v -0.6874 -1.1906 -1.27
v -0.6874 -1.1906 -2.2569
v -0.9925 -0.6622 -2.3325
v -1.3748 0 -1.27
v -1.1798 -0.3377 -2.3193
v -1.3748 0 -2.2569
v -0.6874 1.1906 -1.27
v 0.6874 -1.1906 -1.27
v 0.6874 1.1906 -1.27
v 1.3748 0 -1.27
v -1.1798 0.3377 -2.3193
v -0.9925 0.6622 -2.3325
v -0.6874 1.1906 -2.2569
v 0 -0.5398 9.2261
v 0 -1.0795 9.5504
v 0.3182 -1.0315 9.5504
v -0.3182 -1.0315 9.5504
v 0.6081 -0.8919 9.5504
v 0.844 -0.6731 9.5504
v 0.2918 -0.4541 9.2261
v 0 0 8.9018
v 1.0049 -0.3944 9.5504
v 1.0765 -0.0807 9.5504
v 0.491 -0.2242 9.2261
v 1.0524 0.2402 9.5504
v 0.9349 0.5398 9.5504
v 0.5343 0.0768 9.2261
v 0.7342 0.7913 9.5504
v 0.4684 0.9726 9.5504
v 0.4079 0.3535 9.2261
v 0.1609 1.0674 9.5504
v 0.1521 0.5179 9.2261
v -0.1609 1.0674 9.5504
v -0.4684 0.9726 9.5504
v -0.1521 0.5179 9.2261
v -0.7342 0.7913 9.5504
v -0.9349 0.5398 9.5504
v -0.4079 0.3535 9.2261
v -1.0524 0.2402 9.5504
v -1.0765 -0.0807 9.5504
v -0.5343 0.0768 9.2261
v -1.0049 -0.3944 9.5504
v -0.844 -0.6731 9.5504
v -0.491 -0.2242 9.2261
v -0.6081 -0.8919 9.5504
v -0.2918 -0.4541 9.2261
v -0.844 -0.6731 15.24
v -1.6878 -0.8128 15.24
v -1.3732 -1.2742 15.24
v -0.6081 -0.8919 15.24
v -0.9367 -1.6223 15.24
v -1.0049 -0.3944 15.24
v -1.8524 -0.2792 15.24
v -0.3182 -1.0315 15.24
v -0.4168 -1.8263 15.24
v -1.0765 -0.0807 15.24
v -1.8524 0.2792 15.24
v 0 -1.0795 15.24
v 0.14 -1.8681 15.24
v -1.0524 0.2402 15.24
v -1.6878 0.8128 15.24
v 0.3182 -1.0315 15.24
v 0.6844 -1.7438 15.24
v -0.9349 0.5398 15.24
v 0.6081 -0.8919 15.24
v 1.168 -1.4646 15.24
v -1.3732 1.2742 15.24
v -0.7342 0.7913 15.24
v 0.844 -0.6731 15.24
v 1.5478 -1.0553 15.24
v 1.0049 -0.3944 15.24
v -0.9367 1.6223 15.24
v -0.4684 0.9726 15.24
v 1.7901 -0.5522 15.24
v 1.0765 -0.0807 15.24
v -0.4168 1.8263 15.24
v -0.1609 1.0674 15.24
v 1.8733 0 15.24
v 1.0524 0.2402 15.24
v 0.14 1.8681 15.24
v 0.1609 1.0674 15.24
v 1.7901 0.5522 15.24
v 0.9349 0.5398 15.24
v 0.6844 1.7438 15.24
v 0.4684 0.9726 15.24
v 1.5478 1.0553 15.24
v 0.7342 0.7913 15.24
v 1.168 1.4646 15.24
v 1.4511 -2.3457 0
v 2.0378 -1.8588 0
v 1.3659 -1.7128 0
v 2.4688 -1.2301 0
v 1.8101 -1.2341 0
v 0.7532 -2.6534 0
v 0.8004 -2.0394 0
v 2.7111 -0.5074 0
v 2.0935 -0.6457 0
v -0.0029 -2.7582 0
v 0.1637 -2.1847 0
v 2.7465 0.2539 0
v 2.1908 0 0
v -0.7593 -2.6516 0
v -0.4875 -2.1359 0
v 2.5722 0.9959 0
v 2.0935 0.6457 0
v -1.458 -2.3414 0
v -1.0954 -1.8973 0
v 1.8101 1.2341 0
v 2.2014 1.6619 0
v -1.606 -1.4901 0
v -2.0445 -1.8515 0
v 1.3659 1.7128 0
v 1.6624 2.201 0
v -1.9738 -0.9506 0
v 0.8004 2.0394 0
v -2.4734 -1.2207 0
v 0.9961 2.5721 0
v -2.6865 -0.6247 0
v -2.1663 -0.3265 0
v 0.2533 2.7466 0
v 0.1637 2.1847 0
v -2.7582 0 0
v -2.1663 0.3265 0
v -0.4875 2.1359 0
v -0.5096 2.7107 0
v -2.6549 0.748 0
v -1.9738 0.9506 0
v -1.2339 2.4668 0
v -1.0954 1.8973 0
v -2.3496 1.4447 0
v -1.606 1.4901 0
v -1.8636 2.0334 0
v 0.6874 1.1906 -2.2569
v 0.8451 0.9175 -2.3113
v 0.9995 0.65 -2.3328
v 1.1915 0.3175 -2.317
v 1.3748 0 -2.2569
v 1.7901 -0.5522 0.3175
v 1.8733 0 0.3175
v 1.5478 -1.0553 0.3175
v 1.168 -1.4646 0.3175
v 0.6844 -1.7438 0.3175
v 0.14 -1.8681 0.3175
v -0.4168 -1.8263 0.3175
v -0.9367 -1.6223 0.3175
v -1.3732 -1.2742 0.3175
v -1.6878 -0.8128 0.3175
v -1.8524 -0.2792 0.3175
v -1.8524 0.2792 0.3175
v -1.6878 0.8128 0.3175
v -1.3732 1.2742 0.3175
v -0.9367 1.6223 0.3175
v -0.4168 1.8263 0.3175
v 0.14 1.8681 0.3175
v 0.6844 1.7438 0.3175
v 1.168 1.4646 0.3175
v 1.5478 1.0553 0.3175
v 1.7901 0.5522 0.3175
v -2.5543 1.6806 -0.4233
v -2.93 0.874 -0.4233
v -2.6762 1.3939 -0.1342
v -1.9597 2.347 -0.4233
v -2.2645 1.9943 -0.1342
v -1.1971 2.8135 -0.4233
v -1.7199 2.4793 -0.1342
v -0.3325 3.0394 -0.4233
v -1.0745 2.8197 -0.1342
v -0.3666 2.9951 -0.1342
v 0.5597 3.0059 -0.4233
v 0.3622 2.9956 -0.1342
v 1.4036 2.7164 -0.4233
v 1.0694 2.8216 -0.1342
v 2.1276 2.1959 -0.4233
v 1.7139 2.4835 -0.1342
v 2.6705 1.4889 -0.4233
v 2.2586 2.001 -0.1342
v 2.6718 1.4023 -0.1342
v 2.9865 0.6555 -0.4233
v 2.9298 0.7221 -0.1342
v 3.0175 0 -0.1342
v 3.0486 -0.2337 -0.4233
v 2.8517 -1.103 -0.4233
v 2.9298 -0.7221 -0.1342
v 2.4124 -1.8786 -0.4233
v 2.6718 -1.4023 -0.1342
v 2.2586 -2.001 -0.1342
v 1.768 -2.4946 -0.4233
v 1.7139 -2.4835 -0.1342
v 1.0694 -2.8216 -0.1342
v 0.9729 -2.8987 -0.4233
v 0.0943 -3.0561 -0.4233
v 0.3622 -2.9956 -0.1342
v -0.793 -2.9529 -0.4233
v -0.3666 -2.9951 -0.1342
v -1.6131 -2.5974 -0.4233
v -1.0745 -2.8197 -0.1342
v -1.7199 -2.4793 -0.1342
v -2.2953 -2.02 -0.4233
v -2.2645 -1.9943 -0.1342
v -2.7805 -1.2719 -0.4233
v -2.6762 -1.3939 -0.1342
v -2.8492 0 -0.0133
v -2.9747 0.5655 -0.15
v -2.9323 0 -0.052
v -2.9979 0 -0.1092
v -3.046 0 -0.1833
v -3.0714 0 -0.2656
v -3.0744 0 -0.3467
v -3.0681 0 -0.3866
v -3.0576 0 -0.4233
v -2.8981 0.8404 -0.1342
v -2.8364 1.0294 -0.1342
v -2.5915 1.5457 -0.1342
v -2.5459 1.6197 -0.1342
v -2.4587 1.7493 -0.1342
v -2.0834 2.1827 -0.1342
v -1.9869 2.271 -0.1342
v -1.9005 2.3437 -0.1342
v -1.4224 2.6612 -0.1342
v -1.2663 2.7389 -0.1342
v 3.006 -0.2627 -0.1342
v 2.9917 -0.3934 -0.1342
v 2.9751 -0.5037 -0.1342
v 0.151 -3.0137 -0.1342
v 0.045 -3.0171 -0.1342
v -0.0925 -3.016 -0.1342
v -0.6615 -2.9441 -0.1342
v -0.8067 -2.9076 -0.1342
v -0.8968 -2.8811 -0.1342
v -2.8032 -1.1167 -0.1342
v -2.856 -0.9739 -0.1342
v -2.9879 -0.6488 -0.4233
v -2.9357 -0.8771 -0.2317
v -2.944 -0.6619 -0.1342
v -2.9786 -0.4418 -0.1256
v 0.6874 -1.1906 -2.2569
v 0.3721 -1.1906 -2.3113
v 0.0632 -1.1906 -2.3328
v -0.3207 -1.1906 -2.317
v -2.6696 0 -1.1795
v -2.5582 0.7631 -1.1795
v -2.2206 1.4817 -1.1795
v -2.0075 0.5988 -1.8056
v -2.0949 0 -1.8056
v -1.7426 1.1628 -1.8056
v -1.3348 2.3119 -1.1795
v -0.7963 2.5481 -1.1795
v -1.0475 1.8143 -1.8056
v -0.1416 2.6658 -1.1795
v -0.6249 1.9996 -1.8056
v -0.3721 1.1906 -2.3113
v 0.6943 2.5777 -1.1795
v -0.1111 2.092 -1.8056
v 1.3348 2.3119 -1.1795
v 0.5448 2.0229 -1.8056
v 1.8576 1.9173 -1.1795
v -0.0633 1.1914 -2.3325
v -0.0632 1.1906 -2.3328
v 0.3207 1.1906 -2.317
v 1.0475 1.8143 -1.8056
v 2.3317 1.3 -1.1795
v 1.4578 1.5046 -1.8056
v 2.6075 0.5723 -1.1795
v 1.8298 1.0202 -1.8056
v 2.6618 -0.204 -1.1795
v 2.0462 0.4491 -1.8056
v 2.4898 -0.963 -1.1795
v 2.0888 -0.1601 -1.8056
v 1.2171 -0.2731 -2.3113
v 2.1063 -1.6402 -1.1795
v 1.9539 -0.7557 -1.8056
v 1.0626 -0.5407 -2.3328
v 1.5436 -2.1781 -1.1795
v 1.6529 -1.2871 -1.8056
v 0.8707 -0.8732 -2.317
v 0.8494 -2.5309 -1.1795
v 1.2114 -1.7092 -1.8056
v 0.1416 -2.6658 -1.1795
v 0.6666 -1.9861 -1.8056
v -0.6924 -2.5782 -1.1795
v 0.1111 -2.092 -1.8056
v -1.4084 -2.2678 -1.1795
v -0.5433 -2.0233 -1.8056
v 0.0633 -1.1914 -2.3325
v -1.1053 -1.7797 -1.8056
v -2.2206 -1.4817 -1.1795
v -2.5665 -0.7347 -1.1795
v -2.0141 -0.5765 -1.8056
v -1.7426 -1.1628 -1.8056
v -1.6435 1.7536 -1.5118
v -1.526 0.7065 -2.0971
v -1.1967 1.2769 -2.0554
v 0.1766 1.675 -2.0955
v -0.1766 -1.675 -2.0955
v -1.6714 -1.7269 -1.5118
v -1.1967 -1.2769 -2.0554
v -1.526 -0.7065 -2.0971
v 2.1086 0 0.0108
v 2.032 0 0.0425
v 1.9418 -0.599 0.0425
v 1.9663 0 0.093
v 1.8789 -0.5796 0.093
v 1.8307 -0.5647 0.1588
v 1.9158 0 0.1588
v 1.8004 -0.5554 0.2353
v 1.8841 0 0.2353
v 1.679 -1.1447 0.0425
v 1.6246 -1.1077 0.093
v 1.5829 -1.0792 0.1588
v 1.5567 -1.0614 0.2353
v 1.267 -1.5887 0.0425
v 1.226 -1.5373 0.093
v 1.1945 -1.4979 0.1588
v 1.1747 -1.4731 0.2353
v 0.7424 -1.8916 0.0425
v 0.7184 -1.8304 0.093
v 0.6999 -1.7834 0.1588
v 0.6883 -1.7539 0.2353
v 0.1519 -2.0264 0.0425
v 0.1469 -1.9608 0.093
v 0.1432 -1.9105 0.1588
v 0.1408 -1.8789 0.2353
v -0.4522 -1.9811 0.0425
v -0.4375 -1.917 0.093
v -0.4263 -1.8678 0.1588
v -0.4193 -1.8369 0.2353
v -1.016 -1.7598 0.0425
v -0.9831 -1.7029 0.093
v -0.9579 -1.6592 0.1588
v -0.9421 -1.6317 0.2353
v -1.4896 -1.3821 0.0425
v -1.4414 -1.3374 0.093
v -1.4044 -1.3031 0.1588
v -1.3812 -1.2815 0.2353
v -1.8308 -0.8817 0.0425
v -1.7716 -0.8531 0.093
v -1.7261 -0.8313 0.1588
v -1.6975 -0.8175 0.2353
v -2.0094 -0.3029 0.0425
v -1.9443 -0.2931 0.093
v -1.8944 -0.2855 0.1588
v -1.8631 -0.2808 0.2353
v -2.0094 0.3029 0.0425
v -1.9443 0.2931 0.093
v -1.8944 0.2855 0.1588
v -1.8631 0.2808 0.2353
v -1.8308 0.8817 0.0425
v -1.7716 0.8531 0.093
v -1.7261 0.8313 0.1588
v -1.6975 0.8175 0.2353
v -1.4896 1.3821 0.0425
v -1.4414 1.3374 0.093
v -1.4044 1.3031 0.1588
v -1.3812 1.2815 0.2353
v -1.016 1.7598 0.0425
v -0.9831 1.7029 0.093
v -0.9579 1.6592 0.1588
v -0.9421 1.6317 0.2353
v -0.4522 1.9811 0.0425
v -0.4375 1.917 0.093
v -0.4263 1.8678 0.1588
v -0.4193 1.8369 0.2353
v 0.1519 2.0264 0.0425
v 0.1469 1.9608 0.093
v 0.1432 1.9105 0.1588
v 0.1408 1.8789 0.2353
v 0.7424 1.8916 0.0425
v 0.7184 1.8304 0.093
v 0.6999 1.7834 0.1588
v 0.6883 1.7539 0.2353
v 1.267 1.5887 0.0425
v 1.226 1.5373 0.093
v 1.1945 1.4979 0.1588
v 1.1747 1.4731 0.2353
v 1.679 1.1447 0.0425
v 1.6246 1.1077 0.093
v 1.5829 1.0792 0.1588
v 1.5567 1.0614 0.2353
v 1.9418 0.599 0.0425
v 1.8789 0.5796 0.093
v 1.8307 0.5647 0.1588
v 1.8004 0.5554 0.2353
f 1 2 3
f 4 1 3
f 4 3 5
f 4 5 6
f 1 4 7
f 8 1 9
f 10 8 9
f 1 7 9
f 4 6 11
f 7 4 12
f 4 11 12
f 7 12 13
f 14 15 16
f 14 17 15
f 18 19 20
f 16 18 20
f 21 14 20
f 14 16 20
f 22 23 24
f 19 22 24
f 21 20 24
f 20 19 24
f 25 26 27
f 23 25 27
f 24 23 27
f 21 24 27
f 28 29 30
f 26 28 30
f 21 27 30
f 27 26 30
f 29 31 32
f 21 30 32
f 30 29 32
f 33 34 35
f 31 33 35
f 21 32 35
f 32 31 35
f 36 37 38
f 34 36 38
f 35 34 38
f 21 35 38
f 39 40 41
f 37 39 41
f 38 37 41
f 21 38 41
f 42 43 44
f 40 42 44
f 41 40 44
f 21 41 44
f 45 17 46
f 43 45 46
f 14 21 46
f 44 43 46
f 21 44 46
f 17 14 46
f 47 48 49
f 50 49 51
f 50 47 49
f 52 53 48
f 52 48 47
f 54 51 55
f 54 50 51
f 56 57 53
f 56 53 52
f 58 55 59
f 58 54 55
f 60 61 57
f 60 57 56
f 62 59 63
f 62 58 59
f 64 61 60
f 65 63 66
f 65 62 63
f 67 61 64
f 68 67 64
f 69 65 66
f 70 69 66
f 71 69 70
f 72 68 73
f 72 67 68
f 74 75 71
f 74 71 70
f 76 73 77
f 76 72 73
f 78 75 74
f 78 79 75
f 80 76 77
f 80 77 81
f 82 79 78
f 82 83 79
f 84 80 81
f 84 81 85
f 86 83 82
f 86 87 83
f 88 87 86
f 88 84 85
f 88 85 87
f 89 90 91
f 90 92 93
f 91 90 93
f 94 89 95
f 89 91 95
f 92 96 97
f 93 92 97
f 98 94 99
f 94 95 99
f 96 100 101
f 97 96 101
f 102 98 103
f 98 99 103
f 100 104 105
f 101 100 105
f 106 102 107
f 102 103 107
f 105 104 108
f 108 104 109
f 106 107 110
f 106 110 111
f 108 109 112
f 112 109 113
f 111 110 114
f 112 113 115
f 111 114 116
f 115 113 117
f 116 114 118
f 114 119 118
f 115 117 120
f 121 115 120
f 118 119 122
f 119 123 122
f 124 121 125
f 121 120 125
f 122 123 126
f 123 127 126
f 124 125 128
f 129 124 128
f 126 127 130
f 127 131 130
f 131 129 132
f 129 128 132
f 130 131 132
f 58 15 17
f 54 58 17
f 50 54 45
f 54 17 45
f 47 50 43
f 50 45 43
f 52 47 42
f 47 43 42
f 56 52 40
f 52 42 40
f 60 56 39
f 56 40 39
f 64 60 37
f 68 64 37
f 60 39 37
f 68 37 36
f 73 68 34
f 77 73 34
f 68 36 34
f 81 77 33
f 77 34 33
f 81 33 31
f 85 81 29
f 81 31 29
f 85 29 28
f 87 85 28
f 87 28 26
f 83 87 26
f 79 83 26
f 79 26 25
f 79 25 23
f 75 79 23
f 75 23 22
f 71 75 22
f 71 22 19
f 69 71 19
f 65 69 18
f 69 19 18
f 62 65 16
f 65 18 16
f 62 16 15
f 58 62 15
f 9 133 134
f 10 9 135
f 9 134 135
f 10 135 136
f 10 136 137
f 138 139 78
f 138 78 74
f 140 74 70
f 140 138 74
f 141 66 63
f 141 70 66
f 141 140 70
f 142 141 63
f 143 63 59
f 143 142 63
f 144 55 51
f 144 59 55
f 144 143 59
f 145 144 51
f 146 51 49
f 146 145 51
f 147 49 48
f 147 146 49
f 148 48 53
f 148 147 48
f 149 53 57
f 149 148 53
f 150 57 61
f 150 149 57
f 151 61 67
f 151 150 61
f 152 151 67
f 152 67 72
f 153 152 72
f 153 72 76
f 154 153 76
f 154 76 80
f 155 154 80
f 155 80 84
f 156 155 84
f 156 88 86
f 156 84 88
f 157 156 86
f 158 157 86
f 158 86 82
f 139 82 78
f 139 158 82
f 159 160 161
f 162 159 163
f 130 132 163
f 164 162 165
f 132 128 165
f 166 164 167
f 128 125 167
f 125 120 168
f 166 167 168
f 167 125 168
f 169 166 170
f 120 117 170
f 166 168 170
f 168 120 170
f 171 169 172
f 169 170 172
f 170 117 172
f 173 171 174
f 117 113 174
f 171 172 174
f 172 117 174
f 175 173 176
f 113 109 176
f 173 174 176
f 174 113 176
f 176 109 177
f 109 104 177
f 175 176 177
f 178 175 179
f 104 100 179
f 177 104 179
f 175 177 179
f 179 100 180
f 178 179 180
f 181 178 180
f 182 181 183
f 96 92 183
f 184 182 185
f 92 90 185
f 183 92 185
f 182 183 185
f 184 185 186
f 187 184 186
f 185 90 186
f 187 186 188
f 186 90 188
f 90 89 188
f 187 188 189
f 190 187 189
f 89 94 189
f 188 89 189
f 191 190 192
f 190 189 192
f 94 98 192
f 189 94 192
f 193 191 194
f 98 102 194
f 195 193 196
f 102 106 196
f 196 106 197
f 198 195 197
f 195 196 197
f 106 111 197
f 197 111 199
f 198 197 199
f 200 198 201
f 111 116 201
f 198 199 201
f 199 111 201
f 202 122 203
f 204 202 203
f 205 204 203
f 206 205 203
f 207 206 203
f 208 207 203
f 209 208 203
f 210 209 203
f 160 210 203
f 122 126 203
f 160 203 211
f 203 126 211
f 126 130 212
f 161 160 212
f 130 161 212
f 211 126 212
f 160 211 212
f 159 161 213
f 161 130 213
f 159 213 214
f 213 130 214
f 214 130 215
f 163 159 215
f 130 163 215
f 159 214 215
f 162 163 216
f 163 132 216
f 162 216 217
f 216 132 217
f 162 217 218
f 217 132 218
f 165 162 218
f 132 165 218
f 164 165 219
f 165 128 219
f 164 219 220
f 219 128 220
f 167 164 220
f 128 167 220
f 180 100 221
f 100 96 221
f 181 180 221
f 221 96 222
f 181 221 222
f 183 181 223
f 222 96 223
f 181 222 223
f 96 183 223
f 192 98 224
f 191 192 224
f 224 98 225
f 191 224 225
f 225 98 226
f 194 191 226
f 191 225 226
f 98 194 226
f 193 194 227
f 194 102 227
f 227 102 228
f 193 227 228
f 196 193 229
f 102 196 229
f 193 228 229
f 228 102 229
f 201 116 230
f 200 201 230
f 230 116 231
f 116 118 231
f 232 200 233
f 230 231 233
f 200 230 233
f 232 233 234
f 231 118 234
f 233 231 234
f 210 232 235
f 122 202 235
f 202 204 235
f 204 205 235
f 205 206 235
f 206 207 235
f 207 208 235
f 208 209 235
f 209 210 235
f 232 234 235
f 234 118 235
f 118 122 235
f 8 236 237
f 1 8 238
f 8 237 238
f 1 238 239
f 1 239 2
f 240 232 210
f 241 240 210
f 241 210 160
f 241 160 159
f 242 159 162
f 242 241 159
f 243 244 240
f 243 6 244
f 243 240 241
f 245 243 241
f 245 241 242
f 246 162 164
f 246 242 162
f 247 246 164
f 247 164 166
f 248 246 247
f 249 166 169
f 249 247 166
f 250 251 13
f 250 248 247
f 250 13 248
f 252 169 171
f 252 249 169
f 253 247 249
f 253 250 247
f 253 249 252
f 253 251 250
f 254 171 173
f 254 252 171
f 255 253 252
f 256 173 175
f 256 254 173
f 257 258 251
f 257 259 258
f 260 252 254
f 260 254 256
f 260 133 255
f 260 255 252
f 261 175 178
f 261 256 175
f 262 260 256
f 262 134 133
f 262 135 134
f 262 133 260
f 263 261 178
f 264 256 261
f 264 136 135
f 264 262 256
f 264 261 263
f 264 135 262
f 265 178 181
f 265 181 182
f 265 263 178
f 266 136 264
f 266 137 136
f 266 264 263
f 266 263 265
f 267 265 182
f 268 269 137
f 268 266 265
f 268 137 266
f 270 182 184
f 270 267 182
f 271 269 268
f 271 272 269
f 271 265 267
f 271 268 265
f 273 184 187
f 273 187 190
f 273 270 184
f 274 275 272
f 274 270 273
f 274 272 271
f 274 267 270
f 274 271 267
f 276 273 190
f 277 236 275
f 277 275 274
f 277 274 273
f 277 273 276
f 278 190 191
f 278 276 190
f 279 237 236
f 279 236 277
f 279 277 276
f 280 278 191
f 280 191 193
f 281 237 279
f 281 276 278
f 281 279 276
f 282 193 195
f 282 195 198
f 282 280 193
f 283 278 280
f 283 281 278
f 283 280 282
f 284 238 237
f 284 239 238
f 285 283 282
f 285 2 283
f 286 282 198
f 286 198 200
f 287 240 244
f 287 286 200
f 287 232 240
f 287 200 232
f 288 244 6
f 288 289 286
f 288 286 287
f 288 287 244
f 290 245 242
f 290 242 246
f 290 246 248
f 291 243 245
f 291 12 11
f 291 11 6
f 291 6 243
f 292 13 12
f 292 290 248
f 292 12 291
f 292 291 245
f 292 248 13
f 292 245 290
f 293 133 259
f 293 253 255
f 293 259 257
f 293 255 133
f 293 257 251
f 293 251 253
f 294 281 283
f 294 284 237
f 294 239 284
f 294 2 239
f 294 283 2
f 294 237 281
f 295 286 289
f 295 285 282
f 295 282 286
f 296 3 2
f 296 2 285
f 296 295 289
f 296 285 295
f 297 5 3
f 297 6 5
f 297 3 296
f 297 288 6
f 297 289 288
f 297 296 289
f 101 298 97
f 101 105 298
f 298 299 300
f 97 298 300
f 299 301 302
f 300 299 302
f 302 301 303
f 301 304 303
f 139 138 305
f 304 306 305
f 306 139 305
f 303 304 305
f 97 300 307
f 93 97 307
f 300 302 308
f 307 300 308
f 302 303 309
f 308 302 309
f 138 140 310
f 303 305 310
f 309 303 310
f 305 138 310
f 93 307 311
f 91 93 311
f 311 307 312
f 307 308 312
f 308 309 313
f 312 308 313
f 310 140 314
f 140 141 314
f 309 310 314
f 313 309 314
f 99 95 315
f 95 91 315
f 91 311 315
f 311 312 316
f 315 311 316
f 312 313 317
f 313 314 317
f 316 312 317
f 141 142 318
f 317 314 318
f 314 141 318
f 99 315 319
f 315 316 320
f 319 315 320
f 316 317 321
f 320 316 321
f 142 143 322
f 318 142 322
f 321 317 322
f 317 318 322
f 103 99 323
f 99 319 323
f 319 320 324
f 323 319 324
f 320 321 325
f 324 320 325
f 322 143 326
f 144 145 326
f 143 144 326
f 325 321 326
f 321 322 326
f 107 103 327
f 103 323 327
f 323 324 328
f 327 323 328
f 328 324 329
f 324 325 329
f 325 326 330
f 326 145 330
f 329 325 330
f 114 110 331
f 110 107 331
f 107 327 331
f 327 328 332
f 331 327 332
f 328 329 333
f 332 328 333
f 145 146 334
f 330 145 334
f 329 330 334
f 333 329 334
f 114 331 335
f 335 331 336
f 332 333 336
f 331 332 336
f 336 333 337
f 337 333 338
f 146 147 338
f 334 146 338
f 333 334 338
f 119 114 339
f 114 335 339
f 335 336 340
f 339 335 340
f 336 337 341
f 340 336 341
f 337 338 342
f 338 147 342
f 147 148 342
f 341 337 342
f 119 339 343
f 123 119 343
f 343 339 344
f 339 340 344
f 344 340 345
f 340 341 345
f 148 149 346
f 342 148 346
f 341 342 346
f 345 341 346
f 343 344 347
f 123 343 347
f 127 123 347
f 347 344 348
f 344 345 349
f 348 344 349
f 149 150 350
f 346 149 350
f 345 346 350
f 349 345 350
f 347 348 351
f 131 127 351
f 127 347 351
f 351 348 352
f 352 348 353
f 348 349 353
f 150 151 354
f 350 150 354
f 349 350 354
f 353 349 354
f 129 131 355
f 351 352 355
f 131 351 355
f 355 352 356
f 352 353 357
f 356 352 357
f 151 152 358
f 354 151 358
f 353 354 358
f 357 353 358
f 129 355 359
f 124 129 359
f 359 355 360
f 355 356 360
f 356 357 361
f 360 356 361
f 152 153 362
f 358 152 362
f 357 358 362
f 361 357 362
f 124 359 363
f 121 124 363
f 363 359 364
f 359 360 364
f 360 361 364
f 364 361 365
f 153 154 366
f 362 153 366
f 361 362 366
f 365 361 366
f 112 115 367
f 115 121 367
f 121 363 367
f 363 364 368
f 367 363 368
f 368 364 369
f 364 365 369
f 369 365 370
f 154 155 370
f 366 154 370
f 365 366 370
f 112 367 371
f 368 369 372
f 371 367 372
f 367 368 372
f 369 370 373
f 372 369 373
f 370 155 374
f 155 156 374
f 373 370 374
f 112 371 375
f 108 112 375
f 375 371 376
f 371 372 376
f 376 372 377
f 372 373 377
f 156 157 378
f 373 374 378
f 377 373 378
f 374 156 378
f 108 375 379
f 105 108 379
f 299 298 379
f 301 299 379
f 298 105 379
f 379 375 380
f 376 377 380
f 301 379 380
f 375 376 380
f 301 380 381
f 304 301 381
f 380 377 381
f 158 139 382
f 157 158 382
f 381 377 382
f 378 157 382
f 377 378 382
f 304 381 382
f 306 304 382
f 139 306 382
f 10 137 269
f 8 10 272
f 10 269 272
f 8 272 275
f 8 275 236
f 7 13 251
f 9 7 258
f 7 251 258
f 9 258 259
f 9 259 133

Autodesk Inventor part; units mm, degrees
ref_plane "YZ Plane" through (0, 0, 0) normal (1, 0, 0) x (0, 1, 0)
ref_plane "XZ Plane" through (0, 0, 0) normal (0, 1, 0) x (-1, 0, 0)
sketch "Sketch1" plane through (0, 0, 0) normal (0, 0, 1) x (1, 0, 0)
  circle A0 centre (0, 0) radius 1.8733
  dimension "d0" = 3.7465
extrude "Extrusion1" add sketch "Sketch1" along normal blind 15.24
sketch "Sketch2" plane through (0, 0, 0) normal (0, 0, -1) x (-1, 0, 0)
  circle A0 centre (0, 0) radius 1.8732 projected
  circle A1 centre (0, 0) radius 3.175
  dimension "d3" = 6.35
extrude "Extrusion2" add sketch "Sketch2" along normal blind 2.54 contours A0 | A1
fillet "Fillet1" radius 3.175 1 edges at (3.175, 0, -2.54)
fillet "Fillet2" radius 0.3175 1 edges at (3.175, 0, 0)
fillet "Fillet3" radius 0.3175 1 edges at (-1.8733, 0, 0)
ref_plane "Work Plane1" through (0, 0, -5.3975) normal (0, 0, 1) x (1, 0, 0)
sketch "Sketch4" plane through (0, 0, -5.3975) normal (0, 0, 1) x (1, 0, 0)
  line L0 (1.3748, 0) -> (0.6874, -1.1906)
  line L1 (0.6874, -1.1906) -> (-0.6874, -1.1906)
  line L2 (-0.6874, -1.1906) -> (-1.3748, 0)
  line L3 (-1.3748, 0) -> (-0.6874, 1.1906)
  line L4 (-0.6874, 1.1906) -> (0.6874, 1.1906)
  line L5 (0.6874, 1.1906) -> (1.3748, 0)
  point P0 (0, 0)
  point P1 (0, 0)
  dimension "d19" = 2.3813
extrude "Extrusion3" cut sketch "Sketch4" along normal blind 4.1275
sketch "Sketch5" plane through (0, 0, 15.24) normal (0, 0, 1) x (1, 0, 0)
  point P0 (0, 0)
hole "Hole1" at (0, 0, 15.24) direction (0, 0, -1) diameter 2.159 depth 5.6896 tip angle 118
properties part number "Axel - Female" material "PBT Plastic"
